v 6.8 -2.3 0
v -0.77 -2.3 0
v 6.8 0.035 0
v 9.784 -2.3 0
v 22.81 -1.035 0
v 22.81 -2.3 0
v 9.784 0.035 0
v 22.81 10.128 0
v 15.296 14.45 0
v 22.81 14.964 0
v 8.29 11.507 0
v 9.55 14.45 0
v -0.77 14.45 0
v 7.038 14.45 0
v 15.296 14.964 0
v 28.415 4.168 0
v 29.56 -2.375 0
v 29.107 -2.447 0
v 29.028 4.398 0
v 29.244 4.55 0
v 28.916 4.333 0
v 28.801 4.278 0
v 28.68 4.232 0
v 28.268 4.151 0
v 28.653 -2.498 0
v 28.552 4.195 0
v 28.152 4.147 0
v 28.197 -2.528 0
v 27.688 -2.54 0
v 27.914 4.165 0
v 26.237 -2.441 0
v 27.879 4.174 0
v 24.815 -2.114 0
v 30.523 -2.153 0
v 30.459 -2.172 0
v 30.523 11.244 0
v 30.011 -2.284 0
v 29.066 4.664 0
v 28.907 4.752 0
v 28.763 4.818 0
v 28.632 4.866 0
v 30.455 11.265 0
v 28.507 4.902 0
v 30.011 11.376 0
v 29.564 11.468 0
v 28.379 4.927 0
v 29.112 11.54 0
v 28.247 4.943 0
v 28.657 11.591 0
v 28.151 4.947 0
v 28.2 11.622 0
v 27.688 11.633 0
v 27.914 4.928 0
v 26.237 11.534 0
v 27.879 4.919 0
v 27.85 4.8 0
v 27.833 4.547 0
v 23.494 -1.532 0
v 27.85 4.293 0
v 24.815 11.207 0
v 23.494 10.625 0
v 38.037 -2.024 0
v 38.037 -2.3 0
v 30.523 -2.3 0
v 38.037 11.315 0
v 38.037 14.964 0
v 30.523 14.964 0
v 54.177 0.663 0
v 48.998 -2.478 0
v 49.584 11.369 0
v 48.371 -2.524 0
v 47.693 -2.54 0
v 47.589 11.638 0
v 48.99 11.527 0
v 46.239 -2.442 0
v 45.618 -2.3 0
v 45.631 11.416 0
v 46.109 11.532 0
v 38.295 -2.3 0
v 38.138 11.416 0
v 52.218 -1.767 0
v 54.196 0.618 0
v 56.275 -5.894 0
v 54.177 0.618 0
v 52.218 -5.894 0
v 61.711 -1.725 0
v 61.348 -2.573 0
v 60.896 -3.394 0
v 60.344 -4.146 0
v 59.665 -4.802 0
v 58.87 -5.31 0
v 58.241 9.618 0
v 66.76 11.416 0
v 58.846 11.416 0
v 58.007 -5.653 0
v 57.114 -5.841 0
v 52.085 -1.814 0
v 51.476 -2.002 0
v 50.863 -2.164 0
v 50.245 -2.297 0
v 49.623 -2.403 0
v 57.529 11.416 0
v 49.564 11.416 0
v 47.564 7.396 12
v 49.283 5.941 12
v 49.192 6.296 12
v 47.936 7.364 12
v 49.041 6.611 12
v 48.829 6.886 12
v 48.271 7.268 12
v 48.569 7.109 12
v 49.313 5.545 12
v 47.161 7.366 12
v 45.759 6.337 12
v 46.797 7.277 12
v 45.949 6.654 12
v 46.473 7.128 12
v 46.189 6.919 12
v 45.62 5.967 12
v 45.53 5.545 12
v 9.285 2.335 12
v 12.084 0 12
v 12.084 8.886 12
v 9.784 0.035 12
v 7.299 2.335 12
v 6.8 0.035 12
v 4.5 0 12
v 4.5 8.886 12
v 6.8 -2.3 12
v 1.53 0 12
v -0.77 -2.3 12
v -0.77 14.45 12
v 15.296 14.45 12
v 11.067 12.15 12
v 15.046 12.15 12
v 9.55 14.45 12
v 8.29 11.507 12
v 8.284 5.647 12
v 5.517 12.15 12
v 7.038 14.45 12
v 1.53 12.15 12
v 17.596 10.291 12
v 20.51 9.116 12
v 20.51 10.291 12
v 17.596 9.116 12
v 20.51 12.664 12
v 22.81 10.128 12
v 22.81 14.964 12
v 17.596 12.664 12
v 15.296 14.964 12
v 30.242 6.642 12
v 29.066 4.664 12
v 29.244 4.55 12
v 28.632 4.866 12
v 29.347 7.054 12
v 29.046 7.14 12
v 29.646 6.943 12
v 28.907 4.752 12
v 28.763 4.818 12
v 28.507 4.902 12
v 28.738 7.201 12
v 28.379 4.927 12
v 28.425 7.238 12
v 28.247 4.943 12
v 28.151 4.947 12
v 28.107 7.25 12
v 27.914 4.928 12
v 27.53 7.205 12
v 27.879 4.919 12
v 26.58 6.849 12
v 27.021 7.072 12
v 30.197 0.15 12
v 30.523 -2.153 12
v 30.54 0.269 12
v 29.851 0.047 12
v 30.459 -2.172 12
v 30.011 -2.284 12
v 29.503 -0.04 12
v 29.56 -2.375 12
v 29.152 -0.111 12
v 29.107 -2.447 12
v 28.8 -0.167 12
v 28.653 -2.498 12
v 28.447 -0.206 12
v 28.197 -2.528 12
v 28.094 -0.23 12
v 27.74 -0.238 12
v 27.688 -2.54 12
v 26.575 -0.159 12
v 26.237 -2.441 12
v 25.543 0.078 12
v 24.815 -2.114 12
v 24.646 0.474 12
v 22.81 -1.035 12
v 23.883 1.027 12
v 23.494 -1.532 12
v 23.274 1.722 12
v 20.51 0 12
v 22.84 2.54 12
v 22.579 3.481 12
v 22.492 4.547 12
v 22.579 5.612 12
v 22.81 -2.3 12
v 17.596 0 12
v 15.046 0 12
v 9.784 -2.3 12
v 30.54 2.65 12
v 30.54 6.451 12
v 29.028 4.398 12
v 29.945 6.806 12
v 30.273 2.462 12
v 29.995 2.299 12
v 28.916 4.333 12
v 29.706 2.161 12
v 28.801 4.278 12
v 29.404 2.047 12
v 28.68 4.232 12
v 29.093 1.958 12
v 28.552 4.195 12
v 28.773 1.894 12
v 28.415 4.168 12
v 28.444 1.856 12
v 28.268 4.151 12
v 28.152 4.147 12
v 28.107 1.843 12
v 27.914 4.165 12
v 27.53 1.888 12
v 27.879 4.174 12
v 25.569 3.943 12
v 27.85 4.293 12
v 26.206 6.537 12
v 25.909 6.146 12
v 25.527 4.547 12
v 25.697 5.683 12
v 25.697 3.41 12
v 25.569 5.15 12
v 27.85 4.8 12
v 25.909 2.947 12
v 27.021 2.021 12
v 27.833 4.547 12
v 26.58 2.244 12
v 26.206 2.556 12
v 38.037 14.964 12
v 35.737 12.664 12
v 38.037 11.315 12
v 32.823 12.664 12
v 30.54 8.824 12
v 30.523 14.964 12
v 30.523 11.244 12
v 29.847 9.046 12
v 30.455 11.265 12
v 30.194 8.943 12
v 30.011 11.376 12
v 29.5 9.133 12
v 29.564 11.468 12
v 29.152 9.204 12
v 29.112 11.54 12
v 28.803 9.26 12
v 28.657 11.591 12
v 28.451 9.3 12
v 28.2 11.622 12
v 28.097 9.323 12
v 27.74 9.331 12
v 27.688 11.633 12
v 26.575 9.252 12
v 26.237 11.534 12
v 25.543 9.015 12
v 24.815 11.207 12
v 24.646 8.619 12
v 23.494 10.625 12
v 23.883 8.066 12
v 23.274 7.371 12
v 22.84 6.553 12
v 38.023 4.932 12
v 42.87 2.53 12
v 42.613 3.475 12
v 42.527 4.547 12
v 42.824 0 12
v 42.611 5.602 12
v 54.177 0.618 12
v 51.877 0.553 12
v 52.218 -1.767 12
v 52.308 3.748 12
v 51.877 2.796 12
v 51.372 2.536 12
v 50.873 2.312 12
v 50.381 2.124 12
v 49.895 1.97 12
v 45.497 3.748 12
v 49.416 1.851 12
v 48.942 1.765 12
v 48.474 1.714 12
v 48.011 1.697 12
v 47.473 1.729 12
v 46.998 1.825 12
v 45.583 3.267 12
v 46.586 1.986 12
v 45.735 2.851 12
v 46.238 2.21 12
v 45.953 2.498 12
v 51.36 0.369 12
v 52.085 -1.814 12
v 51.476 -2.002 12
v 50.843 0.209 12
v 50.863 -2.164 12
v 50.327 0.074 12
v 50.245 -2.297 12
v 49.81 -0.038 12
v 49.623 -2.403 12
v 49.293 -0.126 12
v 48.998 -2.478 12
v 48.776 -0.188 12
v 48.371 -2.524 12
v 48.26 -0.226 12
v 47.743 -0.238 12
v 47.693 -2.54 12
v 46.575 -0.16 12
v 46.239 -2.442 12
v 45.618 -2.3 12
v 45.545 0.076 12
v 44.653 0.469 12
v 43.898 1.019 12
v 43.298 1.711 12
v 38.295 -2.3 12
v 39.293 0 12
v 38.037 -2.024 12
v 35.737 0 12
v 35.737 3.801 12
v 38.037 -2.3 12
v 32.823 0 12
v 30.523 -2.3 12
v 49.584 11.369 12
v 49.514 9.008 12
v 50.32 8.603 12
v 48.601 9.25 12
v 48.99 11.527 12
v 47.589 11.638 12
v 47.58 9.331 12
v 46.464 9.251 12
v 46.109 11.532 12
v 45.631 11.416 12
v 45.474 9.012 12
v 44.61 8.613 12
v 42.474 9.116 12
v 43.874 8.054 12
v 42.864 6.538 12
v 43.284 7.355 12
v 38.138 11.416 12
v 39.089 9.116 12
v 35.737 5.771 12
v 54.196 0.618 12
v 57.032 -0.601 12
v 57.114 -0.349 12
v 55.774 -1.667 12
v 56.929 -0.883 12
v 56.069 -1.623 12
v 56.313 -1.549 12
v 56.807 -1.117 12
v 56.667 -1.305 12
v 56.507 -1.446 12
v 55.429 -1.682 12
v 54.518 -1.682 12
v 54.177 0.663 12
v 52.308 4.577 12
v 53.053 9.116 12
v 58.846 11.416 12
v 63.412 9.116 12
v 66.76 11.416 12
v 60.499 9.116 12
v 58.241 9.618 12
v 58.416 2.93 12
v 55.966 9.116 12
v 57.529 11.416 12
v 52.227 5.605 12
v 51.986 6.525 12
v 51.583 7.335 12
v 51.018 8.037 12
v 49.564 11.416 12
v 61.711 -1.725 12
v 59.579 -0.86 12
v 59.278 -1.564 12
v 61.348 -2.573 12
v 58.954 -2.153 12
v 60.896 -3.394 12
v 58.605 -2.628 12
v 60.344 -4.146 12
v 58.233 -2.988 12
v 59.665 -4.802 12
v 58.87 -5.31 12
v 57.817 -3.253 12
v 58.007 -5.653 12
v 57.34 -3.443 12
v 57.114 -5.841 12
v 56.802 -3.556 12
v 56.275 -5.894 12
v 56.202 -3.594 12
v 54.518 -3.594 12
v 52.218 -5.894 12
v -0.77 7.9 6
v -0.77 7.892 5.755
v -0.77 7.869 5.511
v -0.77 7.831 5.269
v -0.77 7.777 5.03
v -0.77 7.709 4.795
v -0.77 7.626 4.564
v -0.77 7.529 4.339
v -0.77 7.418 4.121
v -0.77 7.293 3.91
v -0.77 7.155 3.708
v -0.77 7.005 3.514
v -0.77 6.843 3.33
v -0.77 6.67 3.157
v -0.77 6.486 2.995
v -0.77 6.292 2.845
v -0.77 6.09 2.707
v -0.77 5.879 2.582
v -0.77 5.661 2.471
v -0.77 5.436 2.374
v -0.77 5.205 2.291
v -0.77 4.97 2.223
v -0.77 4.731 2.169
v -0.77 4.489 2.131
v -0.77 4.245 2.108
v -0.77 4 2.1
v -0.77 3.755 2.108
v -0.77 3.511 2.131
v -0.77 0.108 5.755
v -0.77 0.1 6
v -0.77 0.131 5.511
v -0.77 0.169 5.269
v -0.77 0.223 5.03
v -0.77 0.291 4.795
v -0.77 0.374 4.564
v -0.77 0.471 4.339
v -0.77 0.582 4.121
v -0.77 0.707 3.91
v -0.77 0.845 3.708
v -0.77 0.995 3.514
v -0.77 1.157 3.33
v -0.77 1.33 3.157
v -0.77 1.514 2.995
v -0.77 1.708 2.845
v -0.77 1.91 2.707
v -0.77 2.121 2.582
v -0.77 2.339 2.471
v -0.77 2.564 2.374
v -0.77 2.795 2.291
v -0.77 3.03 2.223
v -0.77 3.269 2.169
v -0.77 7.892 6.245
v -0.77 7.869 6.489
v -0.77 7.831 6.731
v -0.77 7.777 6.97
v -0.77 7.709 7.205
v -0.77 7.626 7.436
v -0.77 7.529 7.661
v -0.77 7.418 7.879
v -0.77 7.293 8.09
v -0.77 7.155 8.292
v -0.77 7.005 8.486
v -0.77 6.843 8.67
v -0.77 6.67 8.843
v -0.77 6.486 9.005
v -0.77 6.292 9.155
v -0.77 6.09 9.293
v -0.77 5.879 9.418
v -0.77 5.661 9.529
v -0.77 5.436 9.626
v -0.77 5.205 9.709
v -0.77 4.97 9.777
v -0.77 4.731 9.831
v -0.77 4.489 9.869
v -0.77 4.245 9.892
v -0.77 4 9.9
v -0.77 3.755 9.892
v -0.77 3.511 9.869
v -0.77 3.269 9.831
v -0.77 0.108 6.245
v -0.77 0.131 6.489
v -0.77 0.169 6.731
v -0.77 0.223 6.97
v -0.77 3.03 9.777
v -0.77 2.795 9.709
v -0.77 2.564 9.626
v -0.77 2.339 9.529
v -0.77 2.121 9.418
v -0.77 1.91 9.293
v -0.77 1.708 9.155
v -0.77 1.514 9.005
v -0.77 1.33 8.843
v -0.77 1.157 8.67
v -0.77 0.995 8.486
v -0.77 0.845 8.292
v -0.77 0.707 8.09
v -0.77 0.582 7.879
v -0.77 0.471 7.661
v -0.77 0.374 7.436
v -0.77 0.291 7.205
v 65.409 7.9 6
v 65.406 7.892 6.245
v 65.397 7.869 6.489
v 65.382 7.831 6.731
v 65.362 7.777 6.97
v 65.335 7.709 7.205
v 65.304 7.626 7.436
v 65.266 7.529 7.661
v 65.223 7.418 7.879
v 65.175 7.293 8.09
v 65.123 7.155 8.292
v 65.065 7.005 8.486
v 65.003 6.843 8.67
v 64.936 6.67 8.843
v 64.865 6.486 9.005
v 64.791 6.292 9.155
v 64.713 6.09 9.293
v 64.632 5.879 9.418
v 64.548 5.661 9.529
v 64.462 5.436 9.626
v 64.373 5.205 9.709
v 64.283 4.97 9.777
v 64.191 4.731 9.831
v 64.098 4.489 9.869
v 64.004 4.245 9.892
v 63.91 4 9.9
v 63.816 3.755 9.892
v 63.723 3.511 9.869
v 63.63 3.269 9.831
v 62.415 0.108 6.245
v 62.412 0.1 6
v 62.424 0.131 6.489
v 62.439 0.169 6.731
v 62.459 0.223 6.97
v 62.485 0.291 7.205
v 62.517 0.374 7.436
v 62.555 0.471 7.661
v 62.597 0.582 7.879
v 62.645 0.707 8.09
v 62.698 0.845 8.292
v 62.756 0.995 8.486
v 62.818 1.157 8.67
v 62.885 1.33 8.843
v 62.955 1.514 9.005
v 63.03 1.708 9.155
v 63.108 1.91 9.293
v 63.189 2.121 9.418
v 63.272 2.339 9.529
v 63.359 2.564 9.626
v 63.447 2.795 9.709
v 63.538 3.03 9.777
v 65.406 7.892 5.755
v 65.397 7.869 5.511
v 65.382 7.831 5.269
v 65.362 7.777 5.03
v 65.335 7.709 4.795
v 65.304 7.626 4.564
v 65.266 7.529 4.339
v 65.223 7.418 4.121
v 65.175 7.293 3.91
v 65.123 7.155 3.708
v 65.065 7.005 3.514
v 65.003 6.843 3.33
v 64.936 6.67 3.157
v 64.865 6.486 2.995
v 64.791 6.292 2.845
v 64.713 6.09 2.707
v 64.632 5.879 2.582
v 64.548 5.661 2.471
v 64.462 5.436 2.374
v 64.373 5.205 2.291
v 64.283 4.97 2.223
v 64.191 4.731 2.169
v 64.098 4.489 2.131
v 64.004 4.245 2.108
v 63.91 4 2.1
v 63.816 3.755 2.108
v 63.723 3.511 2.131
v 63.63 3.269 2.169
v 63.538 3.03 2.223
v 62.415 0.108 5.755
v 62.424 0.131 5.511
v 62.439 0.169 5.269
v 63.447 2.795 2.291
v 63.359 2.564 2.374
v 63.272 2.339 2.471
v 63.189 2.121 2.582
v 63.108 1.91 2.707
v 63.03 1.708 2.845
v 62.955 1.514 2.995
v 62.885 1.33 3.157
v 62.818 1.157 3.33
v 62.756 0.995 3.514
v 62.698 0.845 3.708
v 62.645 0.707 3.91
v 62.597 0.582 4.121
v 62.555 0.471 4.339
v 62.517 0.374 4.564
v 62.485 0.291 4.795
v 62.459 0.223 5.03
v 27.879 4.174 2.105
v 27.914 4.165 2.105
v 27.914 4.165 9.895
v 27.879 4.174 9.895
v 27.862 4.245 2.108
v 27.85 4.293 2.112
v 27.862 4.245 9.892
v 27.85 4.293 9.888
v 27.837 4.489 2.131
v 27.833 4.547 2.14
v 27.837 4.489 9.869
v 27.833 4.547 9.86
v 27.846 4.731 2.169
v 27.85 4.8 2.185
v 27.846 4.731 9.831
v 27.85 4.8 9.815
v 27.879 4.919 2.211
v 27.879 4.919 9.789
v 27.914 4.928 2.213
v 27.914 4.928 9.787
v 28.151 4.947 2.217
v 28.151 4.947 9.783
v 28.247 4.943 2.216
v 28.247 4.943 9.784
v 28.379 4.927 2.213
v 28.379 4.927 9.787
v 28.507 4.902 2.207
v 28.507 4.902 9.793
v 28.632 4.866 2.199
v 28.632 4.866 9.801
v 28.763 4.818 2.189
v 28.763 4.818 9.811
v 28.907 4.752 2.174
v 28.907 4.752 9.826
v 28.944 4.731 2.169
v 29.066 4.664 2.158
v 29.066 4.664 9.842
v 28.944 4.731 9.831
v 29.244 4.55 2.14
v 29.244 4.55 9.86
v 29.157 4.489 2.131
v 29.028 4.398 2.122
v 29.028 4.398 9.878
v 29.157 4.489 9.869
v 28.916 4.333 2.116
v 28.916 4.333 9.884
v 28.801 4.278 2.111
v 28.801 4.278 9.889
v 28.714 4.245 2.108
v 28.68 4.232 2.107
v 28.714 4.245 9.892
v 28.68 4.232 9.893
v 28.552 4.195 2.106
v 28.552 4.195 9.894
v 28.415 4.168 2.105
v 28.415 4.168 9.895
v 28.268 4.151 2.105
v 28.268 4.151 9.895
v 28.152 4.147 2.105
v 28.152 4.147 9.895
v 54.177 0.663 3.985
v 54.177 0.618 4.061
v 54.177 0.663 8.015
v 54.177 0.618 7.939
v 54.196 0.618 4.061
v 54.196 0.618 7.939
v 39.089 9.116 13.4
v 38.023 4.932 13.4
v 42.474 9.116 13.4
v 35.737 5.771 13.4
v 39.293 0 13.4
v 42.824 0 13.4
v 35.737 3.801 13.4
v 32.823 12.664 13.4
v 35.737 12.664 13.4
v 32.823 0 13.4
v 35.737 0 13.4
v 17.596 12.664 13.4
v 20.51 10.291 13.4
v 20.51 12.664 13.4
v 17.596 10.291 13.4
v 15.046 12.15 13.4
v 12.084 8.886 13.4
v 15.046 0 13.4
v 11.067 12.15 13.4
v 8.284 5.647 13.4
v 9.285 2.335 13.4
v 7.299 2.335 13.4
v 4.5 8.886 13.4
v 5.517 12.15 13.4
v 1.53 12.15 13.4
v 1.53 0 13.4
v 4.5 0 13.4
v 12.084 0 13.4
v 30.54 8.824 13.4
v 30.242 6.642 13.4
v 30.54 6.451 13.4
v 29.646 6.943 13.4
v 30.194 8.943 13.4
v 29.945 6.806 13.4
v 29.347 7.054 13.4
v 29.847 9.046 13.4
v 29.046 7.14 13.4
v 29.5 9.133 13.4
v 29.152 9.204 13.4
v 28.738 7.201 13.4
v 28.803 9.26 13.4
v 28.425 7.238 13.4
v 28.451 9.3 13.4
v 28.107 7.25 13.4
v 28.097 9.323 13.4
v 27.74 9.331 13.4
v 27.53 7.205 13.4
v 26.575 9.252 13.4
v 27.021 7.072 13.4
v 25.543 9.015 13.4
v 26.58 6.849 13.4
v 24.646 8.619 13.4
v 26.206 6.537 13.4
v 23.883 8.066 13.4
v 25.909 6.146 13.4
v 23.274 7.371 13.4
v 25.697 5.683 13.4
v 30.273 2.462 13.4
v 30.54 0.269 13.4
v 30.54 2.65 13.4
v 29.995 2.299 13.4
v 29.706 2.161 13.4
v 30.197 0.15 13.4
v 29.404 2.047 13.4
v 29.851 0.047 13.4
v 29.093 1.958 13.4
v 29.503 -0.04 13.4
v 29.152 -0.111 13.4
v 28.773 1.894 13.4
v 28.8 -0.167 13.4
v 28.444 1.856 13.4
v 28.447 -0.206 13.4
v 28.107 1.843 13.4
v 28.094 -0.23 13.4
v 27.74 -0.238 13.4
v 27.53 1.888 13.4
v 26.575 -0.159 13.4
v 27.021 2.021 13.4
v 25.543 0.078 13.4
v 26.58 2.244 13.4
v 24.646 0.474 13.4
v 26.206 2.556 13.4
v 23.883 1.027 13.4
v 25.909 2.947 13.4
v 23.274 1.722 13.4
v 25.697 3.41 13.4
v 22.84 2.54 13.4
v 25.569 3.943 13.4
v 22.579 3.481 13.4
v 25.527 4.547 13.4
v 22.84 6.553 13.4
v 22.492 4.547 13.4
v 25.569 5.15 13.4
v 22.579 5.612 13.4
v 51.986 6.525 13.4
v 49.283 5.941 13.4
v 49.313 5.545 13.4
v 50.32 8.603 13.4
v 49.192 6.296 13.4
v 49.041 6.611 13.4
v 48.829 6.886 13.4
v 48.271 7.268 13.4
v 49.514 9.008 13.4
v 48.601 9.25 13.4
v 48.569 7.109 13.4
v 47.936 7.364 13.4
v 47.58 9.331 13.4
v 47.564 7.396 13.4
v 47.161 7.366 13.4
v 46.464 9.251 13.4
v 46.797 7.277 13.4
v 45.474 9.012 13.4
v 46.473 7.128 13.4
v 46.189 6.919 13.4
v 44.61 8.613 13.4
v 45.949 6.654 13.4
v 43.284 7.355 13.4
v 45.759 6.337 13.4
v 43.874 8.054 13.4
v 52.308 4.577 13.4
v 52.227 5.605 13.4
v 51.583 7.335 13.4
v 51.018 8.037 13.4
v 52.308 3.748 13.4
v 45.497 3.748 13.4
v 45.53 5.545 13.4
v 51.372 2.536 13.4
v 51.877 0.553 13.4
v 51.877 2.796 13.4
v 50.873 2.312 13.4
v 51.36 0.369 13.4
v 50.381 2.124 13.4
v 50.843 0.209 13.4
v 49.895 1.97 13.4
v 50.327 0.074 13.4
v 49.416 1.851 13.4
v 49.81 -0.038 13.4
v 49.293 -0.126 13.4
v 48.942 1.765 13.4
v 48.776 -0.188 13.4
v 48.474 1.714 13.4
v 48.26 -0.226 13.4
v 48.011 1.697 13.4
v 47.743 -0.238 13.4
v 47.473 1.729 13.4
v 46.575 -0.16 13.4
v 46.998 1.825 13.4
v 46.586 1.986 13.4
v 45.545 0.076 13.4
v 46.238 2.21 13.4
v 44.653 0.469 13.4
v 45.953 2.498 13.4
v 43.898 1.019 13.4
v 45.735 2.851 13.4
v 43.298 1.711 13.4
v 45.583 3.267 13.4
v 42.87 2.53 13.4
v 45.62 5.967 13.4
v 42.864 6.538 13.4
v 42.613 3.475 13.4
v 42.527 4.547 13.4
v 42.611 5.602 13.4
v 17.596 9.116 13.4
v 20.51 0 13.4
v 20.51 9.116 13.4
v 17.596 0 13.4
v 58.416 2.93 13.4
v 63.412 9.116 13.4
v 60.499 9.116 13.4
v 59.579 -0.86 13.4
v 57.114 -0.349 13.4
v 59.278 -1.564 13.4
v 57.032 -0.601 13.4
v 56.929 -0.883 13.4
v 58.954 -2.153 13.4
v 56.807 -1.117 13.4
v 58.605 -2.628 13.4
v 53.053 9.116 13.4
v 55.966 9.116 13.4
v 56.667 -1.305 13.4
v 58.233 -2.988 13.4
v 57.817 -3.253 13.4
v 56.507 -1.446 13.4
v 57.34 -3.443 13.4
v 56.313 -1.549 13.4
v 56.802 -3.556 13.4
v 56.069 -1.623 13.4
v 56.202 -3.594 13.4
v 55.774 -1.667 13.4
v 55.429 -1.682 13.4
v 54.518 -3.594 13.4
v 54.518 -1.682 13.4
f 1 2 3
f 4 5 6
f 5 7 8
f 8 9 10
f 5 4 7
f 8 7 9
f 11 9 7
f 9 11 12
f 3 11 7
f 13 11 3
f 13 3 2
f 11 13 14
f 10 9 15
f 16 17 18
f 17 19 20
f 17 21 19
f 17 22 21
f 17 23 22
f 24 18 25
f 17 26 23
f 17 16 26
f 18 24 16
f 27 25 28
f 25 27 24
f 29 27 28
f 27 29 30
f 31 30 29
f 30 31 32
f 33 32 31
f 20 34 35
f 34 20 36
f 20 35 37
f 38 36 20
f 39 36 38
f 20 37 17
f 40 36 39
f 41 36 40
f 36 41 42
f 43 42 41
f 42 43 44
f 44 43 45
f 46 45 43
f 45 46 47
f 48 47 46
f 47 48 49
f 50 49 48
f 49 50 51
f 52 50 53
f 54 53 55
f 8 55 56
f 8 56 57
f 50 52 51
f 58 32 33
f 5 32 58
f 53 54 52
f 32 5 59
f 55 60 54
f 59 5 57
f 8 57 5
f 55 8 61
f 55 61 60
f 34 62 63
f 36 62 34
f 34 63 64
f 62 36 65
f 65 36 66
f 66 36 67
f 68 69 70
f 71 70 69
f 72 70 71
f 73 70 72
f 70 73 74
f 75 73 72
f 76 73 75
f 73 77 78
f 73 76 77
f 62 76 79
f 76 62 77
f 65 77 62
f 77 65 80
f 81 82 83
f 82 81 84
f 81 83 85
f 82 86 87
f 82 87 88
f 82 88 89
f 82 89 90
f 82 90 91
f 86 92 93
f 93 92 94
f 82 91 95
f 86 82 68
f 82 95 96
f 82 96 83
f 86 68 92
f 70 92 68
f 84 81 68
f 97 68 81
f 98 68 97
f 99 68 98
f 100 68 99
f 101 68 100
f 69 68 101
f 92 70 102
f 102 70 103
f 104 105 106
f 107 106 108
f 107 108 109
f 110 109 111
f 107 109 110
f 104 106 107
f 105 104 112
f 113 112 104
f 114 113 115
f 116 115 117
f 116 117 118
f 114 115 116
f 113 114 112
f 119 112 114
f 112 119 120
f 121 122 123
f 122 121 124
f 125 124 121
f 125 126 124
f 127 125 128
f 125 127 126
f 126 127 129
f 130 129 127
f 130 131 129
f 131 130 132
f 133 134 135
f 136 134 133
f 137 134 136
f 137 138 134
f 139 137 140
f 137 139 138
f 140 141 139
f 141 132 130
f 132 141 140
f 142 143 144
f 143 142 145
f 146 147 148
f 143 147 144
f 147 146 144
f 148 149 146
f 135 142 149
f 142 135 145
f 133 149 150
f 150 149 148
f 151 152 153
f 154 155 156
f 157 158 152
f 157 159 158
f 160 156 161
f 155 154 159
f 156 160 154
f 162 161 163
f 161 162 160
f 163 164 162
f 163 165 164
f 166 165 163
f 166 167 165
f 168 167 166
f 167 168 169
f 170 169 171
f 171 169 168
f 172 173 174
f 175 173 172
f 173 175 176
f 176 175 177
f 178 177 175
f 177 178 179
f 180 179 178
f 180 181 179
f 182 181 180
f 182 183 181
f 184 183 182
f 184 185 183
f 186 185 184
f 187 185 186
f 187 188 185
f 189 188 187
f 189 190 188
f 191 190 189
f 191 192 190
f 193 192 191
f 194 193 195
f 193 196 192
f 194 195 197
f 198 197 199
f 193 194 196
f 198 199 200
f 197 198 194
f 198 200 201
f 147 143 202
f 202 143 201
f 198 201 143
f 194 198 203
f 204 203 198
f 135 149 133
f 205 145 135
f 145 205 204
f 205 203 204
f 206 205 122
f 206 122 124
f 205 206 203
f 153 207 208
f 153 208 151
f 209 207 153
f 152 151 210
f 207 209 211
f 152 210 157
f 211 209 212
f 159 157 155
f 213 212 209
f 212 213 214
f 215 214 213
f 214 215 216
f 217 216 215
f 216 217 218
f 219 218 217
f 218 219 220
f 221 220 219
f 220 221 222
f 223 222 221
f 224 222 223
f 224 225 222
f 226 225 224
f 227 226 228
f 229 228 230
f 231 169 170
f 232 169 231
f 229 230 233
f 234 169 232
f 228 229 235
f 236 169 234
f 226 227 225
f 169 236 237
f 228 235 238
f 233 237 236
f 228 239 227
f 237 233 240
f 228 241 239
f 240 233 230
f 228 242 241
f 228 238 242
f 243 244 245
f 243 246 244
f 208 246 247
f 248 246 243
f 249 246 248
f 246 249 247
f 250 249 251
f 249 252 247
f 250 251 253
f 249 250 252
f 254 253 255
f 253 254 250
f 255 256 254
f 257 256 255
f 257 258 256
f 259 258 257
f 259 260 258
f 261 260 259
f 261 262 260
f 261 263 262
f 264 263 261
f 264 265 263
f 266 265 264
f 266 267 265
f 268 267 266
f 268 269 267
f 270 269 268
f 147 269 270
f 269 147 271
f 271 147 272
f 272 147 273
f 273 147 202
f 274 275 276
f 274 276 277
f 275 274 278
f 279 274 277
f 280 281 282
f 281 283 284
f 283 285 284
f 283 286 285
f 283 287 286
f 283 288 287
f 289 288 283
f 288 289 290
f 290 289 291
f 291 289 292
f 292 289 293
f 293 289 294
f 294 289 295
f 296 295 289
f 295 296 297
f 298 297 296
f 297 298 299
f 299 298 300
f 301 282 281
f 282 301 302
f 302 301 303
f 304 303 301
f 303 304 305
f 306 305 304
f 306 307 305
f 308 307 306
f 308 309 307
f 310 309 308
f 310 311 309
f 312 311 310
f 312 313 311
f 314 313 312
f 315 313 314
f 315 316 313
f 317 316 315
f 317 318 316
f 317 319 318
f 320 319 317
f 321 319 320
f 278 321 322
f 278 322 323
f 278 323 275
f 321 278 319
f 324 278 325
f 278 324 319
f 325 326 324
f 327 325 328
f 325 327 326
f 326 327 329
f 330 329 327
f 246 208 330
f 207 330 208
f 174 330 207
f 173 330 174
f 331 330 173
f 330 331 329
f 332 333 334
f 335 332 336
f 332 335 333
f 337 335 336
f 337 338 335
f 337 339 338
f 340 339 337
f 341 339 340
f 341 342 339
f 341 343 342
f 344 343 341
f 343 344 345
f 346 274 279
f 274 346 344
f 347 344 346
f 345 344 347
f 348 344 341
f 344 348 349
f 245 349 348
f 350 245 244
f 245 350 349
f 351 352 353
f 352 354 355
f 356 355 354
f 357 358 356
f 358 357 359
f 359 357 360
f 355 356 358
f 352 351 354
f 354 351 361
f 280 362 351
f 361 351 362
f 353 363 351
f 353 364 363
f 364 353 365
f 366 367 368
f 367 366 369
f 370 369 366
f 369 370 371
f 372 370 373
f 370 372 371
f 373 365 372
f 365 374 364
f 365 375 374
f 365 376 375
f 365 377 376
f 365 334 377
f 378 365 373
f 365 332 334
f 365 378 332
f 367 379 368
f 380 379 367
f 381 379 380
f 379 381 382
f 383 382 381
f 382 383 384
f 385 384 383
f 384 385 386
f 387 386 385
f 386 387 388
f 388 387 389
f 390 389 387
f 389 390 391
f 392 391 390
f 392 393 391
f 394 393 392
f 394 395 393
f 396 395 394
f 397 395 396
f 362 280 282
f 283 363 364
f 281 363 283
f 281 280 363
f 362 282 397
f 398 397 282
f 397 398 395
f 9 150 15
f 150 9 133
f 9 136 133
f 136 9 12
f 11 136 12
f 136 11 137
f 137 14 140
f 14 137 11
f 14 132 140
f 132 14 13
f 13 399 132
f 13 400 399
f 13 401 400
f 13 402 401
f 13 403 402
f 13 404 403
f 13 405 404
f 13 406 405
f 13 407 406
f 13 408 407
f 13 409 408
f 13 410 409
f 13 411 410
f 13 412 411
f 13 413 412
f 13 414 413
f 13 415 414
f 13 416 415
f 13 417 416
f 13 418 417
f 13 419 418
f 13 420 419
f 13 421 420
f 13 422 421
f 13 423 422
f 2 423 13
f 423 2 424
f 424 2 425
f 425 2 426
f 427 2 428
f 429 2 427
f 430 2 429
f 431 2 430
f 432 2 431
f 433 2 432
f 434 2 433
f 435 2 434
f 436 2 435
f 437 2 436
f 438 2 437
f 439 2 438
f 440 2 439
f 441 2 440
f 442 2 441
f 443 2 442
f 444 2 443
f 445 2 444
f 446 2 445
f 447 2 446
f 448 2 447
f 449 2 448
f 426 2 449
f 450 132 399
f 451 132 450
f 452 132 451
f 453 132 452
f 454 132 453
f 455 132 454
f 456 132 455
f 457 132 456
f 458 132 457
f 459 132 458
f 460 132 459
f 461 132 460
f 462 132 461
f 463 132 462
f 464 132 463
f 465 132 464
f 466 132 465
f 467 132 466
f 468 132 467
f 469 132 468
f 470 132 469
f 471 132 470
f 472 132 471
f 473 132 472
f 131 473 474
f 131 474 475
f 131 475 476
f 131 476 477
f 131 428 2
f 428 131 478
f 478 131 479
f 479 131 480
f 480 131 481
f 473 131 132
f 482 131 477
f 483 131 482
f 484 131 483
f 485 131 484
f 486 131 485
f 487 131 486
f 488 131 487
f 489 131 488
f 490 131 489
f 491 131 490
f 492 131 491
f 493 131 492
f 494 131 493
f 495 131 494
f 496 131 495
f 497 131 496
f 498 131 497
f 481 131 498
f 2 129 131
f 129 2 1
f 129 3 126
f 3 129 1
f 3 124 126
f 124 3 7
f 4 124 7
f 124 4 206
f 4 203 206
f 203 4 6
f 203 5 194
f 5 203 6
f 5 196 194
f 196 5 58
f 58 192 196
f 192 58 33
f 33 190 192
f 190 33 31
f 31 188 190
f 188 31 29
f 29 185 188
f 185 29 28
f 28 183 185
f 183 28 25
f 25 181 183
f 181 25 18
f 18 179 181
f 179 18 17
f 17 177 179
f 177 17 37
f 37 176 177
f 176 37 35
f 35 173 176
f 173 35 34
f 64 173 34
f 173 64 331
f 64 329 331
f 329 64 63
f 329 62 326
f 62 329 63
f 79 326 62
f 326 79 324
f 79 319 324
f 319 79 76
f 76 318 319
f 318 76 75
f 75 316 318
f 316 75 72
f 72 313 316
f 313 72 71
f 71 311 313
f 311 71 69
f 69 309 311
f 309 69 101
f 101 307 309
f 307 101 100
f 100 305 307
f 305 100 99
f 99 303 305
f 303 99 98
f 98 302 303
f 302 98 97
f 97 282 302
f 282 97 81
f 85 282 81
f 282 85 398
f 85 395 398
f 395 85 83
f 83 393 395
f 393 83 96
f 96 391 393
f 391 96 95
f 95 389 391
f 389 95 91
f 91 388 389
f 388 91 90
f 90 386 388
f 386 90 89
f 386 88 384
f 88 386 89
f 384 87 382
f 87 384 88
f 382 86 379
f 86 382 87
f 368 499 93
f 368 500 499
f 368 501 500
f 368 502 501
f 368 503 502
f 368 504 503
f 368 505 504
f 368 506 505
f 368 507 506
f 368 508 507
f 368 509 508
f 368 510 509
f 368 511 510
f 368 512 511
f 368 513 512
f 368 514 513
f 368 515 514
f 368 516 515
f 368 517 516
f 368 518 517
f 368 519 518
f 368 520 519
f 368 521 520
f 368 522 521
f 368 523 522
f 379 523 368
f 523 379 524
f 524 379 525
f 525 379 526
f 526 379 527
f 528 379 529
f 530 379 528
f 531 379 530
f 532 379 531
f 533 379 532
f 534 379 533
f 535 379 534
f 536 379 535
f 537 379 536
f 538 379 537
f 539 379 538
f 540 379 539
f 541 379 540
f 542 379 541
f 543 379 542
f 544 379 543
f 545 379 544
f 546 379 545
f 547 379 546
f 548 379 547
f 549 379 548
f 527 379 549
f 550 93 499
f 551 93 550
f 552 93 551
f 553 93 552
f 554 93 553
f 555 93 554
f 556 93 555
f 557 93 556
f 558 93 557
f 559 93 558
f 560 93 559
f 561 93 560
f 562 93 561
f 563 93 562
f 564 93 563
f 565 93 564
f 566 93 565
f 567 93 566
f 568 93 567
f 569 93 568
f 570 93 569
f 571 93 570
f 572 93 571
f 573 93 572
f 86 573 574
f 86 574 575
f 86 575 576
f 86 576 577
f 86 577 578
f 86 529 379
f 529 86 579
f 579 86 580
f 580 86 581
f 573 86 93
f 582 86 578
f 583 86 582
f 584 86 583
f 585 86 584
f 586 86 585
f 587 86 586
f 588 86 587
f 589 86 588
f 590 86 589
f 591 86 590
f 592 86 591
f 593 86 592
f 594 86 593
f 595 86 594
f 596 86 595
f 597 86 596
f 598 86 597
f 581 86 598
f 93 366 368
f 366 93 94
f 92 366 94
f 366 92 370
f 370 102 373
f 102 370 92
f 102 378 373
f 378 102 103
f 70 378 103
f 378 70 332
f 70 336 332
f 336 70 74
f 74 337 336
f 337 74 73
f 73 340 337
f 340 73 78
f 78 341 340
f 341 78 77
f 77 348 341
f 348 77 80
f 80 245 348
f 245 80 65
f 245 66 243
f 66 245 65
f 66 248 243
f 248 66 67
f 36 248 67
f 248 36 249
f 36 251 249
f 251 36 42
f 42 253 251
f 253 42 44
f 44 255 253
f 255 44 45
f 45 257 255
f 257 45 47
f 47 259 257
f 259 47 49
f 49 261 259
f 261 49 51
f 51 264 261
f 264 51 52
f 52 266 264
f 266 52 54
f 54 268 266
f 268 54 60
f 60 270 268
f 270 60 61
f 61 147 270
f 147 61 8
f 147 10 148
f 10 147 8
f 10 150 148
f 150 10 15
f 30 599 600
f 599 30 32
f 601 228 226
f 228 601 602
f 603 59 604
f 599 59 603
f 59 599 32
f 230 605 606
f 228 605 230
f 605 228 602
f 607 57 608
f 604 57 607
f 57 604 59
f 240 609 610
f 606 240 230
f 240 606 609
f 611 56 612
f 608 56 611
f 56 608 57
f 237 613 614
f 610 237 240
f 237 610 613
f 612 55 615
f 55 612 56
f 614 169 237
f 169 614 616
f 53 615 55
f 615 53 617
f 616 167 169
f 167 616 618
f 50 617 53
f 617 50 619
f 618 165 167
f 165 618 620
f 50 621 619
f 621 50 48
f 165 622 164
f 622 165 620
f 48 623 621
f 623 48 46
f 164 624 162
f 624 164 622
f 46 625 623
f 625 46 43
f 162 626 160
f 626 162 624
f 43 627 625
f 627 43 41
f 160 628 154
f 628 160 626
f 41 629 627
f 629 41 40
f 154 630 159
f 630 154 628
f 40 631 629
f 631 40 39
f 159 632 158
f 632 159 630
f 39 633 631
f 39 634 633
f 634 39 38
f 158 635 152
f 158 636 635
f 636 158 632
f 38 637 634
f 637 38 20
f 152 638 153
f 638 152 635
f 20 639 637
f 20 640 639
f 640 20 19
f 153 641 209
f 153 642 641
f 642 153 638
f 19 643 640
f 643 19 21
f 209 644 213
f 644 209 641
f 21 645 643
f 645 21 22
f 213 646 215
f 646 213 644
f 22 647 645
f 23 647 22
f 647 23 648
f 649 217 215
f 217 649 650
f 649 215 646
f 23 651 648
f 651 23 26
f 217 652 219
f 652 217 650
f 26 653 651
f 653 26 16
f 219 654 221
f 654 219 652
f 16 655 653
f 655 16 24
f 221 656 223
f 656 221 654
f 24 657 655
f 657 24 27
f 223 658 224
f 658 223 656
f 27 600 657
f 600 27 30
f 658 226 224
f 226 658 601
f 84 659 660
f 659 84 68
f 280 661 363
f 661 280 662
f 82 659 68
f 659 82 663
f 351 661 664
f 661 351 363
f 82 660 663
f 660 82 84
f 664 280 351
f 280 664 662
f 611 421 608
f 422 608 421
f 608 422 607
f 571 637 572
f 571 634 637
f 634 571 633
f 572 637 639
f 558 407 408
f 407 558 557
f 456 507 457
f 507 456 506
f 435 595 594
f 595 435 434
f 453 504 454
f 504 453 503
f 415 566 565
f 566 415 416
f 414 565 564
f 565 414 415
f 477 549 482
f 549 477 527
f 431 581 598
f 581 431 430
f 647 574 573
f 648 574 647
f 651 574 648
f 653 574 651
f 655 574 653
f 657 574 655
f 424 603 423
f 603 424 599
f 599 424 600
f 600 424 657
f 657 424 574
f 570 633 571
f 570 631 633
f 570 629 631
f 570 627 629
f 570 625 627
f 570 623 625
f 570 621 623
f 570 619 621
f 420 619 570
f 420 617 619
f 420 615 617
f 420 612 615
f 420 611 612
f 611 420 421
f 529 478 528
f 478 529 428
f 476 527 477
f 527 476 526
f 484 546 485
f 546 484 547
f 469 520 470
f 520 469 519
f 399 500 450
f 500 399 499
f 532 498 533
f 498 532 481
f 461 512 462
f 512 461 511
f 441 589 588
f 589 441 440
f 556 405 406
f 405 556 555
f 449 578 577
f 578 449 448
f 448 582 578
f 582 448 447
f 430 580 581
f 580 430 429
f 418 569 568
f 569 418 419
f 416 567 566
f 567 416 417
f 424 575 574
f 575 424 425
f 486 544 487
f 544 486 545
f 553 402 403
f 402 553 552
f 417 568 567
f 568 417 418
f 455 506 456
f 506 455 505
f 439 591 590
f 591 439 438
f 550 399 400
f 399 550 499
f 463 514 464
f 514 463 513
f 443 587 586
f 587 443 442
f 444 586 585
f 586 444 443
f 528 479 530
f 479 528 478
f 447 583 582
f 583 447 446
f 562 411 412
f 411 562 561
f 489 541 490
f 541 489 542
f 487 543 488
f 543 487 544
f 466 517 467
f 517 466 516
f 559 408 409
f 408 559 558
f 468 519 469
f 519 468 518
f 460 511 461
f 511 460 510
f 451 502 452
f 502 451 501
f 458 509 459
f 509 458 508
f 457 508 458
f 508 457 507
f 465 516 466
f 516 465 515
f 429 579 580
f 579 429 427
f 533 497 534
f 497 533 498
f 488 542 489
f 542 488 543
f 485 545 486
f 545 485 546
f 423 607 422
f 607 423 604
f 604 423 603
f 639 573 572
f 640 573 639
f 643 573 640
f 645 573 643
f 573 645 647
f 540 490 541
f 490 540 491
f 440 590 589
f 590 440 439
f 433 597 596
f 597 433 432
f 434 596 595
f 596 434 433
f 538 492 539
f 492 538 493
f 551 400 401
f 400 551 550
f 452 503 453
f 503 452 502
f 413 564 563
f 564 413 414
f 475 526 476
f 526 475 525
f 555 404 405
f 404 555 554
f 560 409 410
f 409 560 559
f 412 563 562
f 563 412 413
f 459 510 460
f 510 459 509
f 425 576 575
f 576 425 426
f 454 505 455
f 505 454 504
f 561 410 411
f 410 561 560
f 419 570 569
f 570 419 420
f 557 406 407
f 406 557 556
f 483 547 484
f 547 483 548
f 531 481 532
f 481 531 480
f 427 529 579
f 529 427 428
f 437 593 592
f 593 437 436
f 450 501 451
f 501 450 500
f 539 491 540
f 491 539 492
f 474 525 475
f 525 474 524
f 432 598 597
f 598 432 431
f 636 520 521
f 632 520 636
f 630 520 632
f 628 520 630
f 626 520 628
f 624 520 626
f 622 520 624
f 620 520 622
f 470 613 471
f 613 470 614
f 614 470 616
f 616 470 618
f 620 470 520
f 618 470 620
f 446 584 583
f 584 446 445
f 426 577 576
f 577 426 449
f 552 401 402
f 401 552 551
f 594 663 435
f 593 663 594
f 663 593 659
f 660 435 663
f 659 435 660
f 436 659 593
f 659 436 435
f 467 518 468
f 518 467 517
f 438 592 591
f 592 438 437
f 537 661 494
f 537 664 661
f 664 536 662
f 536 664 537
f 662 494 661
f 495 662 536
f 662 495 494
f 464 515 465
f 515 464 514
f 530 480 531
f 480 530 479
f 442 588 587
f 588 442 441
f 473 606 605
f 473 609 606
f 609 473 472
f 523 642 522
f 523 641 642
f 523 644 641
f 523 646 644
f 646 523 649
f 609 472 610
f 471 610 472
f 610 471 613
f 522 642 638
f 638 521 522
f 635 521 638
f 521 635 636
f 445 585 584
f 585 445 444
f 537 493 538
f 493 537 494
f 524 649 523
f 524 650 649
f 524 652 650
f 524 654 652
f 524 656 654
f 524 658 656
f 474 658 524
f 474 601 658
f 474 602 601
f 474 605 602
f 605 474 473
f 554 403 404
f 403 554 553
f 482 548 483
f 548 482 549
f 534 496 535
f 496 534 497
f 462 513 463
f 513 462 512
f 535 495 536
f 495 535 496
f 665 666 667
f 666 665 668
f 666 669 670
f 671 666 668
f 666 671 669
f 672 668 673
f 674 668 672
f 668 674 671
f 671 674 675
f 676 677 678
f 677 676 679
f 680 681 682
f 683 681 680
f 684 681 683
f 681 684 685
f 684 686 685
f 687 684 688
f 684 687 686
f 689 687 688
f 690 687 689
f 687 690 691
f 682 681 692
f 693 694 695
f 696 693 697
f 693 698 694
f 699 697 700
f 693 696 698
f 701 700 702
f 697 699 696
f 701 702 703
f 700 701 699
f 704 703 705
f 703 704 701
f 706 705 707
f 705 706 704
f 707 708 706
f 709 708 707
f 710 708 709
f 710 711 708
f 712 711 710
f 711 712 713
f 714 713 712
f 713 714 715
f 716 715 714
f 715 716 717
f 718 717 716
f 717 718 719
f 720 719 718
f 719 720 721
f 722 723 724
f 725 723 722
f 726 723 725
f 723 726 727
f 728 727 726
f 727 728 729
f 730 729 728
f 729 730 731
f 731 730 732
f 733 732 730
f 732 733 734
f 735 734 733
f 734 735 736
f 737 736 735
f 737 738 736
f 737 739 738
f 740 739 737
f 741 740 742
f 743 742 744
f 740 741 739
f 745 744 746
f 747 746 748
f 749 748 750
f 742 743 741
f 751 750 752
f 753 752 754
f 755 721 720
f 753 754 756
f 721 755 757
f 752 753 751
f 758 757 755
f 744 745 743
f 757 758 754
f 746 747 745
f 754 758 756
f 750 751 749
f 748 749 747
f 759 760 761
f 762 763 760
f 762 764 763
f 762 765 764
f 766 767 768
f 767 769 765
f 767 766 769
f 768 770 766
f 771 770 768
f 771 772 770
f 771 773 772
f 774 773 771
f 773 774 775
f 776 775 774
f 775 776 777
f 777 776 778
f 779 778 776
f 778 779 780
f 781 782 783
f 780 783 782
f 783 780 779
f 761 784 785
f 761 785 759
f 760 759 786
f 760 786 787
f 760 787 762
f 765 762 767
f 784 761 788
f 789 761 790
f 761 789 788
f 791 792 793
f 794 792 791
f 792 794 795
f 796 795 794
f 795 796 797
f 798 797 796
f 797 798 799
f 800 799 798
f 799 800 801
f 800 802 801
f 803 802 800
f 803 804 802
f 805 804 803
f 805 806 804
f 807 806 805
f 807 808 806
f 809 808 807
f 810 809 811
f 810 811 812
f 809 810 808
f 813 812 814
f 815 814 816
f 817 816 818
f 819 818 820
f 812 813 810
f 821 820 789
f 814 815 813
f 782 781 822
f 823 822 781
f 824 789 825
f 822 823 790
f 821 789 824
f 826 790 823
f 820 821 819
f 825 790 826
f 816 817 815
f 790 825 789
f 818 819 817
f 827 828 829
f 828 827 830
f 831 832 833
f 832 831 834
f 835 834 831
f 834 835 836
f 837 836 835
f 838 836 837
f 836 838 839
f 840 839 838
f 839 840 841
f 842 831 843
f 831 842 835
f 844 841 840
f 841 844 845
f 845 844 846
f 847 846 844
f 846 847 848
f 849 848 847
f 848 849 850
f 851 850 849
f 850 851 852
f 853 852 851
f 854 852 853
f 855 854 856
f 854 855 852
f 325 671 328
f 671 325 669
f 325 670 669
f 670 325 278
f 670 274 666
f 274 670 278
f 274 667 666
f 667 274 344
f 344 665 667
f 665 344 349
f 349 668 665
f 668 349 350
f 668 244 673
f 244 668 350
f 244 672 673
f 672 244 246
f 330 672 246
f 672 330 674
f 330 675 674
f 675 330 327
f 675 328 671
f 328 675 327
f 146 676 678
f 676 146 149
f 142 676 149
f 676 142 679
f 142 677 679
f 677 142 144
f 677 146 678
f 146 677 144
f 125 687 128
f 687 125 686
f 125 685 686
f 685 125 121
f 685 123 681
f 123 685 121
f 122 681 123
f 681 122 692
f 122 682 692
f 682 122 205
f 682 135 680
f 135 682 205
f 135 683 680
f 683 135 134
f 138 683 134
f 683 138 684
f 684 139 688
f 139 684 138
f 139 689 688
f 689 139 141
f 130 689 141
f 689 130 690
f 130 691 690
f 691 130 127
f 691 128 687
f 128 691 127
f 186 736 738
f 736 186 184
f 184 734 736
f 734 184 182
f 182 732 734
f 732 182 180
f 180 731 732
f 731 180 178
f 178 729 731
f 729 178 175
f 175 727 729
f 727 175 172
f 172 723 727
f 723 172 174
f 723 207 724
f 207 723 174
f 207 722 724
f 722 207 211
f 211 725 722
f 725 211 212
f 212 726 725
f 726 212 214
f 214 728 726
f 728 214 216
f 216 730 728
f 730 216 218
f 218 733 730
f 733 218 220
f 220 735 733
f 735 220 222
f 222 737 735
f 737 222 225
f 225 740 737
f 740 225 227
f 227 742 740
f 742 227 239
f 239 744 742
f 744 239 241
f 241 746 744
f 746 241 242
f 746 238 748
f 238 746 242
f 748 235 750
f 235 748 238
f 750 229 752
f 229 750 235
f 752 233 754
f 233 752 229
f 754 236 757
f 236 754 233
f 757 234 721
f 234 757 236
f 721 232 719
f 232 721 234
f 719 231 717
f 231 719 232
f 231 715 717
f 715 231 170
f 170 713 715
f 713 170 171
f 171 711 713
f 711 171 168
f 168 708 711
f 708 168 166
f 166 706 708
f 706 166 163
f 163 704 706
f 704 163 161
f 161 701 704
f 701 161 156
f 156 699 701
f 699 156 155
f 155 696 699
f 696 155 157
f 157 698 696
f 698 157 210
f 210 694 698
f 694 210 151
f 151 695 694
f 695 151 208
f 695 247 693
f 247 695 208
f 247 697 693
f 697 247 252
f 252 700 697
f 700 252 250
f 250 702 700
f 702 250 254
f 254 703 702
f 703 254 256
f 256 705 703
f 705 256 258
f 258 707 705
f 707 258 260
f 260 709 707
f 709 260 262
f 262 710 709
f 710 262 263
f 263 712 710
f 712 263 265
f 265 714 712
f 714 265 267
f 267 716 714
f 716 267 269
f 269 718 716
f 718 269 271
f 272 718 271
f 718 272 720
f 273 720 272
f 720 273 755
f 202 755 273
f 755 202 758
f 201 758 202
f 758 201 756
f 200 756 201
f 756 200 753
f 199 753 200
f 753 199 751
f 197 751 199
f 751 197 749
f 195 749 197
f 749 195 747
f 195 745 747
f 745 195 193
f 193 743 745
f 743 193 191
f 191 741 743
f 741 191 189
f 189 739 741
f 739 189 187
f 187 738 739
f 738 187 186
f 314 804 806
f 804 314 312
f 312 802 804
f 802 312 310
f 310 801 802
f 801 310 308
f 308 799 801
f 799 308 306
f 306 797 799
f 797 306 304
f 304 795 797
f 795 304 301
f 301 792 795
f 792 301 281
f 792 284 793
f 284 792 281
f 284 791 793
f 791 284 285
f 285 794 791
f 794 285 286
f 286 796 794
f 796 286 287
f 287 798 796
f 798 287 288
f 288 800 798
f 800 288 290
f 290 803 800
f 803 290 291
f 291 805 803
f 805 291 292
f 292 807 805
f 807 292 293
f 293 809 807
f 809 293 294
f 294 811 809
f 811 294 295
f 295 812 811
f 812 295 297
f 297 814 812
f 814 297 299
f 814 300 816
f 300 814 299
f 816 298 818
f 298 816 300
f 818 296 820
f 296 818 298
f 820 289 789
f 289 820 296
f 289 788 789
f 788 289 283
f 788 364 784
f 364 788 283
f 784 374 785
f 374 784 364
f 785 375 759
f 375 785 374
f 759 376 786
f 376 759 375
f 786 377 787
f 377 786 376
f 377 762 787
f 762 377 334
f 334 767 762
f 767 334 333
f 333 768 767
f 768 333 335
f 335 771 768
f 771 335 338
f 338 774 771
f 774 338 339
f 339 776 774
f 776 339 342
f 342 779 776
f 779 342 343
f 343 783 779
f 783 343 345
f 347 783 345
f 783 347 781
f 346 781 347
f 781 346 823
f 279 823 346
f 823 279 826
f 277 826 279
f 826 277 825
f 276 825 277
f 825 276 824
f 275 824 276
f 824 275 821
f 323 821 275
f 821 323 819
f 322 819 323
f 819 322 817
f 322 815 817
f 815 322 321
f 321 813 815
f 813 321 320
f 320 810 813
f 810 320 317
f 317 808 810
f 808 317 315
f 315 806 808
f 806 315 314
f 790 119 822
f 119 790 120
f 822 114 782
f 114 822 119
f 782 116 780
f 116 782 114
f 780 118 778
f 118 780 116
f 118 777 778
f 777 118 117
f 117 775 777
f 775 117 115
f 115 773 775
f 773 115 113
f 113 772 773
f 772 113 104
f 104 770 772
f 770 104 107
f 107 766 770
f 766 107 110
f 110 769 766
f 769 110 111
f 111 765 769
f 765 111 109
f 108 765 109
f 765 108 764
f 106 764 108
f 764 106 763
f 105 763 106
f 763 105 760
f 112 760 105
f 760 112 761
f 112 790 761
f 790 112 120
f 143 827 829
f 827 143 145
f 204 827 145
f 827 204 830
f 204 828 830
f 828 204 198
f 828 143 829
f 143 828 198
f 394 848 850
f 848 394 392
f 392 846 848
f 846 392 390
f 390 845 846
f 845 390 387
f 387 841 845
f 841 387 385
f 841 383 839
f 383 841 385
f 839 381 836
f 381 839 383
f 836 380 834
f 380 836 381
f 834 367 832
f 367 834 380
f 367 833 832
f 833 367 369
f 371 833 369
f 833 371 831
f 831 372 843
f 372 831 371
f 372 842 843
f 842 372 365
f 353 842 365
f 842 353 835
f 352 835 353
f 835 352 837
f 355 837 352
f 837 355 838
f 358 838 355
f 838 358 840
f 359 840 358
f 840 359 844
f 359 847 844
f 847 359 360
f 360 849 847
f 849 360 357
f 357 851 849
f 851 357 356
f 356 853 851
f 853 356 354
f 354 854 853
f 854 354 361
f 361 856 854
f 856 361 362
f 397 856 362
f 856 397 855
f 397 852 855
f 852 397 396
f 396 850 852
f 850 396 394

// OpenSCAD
text_string="Mickey";
font_name="Comic Neue:style=Bold";
letter_height=12;
letter_thickness=1.4;
base_height=12;
outline_margin=2.3;
hole_orientation="FRONTBACK";
hole_diameter=7.8;
hole_length=150;
hole_x=21;
hole_y=4;
hole_z=base_height/2;
rtl=false;
text_halign=rtl?"right":"left";
part="all";
module base_with_tunnel(){
 difference(){
  linear_extrude(height=base_height)
   offset(delta=outline_margin)
    text(text_string,size=letter_height,font=font_name,halign=text_halign,valign="baseline");
  if(hole_orientation=="FRONTBACK")
   translate([0,hole_y,hole_z])rotate([0,90,0])cylinder(d=hole_diameter,h=hole_length,center=true,$fn=100);
  else if(hole_orientation=="TOPBOTTOM")
   translate([hole_x,0,hole_z])rotate([90,0,0])cylinder(d=hole_diameter,h=hole_length,center=true,$fn=100);
 }
}
module raised_letters(){
 translate([0,0,base_height])linear_extrude(height=letter_thickness)
  text(text_string,size=letter_height,font=font_name,halign=text_halign,valign="baseline");
}
if(part=="base")base_with_tunnel();
else if(part=="letters")raised_letters();
else union(){base_with_tunnel();raised_letters();}
